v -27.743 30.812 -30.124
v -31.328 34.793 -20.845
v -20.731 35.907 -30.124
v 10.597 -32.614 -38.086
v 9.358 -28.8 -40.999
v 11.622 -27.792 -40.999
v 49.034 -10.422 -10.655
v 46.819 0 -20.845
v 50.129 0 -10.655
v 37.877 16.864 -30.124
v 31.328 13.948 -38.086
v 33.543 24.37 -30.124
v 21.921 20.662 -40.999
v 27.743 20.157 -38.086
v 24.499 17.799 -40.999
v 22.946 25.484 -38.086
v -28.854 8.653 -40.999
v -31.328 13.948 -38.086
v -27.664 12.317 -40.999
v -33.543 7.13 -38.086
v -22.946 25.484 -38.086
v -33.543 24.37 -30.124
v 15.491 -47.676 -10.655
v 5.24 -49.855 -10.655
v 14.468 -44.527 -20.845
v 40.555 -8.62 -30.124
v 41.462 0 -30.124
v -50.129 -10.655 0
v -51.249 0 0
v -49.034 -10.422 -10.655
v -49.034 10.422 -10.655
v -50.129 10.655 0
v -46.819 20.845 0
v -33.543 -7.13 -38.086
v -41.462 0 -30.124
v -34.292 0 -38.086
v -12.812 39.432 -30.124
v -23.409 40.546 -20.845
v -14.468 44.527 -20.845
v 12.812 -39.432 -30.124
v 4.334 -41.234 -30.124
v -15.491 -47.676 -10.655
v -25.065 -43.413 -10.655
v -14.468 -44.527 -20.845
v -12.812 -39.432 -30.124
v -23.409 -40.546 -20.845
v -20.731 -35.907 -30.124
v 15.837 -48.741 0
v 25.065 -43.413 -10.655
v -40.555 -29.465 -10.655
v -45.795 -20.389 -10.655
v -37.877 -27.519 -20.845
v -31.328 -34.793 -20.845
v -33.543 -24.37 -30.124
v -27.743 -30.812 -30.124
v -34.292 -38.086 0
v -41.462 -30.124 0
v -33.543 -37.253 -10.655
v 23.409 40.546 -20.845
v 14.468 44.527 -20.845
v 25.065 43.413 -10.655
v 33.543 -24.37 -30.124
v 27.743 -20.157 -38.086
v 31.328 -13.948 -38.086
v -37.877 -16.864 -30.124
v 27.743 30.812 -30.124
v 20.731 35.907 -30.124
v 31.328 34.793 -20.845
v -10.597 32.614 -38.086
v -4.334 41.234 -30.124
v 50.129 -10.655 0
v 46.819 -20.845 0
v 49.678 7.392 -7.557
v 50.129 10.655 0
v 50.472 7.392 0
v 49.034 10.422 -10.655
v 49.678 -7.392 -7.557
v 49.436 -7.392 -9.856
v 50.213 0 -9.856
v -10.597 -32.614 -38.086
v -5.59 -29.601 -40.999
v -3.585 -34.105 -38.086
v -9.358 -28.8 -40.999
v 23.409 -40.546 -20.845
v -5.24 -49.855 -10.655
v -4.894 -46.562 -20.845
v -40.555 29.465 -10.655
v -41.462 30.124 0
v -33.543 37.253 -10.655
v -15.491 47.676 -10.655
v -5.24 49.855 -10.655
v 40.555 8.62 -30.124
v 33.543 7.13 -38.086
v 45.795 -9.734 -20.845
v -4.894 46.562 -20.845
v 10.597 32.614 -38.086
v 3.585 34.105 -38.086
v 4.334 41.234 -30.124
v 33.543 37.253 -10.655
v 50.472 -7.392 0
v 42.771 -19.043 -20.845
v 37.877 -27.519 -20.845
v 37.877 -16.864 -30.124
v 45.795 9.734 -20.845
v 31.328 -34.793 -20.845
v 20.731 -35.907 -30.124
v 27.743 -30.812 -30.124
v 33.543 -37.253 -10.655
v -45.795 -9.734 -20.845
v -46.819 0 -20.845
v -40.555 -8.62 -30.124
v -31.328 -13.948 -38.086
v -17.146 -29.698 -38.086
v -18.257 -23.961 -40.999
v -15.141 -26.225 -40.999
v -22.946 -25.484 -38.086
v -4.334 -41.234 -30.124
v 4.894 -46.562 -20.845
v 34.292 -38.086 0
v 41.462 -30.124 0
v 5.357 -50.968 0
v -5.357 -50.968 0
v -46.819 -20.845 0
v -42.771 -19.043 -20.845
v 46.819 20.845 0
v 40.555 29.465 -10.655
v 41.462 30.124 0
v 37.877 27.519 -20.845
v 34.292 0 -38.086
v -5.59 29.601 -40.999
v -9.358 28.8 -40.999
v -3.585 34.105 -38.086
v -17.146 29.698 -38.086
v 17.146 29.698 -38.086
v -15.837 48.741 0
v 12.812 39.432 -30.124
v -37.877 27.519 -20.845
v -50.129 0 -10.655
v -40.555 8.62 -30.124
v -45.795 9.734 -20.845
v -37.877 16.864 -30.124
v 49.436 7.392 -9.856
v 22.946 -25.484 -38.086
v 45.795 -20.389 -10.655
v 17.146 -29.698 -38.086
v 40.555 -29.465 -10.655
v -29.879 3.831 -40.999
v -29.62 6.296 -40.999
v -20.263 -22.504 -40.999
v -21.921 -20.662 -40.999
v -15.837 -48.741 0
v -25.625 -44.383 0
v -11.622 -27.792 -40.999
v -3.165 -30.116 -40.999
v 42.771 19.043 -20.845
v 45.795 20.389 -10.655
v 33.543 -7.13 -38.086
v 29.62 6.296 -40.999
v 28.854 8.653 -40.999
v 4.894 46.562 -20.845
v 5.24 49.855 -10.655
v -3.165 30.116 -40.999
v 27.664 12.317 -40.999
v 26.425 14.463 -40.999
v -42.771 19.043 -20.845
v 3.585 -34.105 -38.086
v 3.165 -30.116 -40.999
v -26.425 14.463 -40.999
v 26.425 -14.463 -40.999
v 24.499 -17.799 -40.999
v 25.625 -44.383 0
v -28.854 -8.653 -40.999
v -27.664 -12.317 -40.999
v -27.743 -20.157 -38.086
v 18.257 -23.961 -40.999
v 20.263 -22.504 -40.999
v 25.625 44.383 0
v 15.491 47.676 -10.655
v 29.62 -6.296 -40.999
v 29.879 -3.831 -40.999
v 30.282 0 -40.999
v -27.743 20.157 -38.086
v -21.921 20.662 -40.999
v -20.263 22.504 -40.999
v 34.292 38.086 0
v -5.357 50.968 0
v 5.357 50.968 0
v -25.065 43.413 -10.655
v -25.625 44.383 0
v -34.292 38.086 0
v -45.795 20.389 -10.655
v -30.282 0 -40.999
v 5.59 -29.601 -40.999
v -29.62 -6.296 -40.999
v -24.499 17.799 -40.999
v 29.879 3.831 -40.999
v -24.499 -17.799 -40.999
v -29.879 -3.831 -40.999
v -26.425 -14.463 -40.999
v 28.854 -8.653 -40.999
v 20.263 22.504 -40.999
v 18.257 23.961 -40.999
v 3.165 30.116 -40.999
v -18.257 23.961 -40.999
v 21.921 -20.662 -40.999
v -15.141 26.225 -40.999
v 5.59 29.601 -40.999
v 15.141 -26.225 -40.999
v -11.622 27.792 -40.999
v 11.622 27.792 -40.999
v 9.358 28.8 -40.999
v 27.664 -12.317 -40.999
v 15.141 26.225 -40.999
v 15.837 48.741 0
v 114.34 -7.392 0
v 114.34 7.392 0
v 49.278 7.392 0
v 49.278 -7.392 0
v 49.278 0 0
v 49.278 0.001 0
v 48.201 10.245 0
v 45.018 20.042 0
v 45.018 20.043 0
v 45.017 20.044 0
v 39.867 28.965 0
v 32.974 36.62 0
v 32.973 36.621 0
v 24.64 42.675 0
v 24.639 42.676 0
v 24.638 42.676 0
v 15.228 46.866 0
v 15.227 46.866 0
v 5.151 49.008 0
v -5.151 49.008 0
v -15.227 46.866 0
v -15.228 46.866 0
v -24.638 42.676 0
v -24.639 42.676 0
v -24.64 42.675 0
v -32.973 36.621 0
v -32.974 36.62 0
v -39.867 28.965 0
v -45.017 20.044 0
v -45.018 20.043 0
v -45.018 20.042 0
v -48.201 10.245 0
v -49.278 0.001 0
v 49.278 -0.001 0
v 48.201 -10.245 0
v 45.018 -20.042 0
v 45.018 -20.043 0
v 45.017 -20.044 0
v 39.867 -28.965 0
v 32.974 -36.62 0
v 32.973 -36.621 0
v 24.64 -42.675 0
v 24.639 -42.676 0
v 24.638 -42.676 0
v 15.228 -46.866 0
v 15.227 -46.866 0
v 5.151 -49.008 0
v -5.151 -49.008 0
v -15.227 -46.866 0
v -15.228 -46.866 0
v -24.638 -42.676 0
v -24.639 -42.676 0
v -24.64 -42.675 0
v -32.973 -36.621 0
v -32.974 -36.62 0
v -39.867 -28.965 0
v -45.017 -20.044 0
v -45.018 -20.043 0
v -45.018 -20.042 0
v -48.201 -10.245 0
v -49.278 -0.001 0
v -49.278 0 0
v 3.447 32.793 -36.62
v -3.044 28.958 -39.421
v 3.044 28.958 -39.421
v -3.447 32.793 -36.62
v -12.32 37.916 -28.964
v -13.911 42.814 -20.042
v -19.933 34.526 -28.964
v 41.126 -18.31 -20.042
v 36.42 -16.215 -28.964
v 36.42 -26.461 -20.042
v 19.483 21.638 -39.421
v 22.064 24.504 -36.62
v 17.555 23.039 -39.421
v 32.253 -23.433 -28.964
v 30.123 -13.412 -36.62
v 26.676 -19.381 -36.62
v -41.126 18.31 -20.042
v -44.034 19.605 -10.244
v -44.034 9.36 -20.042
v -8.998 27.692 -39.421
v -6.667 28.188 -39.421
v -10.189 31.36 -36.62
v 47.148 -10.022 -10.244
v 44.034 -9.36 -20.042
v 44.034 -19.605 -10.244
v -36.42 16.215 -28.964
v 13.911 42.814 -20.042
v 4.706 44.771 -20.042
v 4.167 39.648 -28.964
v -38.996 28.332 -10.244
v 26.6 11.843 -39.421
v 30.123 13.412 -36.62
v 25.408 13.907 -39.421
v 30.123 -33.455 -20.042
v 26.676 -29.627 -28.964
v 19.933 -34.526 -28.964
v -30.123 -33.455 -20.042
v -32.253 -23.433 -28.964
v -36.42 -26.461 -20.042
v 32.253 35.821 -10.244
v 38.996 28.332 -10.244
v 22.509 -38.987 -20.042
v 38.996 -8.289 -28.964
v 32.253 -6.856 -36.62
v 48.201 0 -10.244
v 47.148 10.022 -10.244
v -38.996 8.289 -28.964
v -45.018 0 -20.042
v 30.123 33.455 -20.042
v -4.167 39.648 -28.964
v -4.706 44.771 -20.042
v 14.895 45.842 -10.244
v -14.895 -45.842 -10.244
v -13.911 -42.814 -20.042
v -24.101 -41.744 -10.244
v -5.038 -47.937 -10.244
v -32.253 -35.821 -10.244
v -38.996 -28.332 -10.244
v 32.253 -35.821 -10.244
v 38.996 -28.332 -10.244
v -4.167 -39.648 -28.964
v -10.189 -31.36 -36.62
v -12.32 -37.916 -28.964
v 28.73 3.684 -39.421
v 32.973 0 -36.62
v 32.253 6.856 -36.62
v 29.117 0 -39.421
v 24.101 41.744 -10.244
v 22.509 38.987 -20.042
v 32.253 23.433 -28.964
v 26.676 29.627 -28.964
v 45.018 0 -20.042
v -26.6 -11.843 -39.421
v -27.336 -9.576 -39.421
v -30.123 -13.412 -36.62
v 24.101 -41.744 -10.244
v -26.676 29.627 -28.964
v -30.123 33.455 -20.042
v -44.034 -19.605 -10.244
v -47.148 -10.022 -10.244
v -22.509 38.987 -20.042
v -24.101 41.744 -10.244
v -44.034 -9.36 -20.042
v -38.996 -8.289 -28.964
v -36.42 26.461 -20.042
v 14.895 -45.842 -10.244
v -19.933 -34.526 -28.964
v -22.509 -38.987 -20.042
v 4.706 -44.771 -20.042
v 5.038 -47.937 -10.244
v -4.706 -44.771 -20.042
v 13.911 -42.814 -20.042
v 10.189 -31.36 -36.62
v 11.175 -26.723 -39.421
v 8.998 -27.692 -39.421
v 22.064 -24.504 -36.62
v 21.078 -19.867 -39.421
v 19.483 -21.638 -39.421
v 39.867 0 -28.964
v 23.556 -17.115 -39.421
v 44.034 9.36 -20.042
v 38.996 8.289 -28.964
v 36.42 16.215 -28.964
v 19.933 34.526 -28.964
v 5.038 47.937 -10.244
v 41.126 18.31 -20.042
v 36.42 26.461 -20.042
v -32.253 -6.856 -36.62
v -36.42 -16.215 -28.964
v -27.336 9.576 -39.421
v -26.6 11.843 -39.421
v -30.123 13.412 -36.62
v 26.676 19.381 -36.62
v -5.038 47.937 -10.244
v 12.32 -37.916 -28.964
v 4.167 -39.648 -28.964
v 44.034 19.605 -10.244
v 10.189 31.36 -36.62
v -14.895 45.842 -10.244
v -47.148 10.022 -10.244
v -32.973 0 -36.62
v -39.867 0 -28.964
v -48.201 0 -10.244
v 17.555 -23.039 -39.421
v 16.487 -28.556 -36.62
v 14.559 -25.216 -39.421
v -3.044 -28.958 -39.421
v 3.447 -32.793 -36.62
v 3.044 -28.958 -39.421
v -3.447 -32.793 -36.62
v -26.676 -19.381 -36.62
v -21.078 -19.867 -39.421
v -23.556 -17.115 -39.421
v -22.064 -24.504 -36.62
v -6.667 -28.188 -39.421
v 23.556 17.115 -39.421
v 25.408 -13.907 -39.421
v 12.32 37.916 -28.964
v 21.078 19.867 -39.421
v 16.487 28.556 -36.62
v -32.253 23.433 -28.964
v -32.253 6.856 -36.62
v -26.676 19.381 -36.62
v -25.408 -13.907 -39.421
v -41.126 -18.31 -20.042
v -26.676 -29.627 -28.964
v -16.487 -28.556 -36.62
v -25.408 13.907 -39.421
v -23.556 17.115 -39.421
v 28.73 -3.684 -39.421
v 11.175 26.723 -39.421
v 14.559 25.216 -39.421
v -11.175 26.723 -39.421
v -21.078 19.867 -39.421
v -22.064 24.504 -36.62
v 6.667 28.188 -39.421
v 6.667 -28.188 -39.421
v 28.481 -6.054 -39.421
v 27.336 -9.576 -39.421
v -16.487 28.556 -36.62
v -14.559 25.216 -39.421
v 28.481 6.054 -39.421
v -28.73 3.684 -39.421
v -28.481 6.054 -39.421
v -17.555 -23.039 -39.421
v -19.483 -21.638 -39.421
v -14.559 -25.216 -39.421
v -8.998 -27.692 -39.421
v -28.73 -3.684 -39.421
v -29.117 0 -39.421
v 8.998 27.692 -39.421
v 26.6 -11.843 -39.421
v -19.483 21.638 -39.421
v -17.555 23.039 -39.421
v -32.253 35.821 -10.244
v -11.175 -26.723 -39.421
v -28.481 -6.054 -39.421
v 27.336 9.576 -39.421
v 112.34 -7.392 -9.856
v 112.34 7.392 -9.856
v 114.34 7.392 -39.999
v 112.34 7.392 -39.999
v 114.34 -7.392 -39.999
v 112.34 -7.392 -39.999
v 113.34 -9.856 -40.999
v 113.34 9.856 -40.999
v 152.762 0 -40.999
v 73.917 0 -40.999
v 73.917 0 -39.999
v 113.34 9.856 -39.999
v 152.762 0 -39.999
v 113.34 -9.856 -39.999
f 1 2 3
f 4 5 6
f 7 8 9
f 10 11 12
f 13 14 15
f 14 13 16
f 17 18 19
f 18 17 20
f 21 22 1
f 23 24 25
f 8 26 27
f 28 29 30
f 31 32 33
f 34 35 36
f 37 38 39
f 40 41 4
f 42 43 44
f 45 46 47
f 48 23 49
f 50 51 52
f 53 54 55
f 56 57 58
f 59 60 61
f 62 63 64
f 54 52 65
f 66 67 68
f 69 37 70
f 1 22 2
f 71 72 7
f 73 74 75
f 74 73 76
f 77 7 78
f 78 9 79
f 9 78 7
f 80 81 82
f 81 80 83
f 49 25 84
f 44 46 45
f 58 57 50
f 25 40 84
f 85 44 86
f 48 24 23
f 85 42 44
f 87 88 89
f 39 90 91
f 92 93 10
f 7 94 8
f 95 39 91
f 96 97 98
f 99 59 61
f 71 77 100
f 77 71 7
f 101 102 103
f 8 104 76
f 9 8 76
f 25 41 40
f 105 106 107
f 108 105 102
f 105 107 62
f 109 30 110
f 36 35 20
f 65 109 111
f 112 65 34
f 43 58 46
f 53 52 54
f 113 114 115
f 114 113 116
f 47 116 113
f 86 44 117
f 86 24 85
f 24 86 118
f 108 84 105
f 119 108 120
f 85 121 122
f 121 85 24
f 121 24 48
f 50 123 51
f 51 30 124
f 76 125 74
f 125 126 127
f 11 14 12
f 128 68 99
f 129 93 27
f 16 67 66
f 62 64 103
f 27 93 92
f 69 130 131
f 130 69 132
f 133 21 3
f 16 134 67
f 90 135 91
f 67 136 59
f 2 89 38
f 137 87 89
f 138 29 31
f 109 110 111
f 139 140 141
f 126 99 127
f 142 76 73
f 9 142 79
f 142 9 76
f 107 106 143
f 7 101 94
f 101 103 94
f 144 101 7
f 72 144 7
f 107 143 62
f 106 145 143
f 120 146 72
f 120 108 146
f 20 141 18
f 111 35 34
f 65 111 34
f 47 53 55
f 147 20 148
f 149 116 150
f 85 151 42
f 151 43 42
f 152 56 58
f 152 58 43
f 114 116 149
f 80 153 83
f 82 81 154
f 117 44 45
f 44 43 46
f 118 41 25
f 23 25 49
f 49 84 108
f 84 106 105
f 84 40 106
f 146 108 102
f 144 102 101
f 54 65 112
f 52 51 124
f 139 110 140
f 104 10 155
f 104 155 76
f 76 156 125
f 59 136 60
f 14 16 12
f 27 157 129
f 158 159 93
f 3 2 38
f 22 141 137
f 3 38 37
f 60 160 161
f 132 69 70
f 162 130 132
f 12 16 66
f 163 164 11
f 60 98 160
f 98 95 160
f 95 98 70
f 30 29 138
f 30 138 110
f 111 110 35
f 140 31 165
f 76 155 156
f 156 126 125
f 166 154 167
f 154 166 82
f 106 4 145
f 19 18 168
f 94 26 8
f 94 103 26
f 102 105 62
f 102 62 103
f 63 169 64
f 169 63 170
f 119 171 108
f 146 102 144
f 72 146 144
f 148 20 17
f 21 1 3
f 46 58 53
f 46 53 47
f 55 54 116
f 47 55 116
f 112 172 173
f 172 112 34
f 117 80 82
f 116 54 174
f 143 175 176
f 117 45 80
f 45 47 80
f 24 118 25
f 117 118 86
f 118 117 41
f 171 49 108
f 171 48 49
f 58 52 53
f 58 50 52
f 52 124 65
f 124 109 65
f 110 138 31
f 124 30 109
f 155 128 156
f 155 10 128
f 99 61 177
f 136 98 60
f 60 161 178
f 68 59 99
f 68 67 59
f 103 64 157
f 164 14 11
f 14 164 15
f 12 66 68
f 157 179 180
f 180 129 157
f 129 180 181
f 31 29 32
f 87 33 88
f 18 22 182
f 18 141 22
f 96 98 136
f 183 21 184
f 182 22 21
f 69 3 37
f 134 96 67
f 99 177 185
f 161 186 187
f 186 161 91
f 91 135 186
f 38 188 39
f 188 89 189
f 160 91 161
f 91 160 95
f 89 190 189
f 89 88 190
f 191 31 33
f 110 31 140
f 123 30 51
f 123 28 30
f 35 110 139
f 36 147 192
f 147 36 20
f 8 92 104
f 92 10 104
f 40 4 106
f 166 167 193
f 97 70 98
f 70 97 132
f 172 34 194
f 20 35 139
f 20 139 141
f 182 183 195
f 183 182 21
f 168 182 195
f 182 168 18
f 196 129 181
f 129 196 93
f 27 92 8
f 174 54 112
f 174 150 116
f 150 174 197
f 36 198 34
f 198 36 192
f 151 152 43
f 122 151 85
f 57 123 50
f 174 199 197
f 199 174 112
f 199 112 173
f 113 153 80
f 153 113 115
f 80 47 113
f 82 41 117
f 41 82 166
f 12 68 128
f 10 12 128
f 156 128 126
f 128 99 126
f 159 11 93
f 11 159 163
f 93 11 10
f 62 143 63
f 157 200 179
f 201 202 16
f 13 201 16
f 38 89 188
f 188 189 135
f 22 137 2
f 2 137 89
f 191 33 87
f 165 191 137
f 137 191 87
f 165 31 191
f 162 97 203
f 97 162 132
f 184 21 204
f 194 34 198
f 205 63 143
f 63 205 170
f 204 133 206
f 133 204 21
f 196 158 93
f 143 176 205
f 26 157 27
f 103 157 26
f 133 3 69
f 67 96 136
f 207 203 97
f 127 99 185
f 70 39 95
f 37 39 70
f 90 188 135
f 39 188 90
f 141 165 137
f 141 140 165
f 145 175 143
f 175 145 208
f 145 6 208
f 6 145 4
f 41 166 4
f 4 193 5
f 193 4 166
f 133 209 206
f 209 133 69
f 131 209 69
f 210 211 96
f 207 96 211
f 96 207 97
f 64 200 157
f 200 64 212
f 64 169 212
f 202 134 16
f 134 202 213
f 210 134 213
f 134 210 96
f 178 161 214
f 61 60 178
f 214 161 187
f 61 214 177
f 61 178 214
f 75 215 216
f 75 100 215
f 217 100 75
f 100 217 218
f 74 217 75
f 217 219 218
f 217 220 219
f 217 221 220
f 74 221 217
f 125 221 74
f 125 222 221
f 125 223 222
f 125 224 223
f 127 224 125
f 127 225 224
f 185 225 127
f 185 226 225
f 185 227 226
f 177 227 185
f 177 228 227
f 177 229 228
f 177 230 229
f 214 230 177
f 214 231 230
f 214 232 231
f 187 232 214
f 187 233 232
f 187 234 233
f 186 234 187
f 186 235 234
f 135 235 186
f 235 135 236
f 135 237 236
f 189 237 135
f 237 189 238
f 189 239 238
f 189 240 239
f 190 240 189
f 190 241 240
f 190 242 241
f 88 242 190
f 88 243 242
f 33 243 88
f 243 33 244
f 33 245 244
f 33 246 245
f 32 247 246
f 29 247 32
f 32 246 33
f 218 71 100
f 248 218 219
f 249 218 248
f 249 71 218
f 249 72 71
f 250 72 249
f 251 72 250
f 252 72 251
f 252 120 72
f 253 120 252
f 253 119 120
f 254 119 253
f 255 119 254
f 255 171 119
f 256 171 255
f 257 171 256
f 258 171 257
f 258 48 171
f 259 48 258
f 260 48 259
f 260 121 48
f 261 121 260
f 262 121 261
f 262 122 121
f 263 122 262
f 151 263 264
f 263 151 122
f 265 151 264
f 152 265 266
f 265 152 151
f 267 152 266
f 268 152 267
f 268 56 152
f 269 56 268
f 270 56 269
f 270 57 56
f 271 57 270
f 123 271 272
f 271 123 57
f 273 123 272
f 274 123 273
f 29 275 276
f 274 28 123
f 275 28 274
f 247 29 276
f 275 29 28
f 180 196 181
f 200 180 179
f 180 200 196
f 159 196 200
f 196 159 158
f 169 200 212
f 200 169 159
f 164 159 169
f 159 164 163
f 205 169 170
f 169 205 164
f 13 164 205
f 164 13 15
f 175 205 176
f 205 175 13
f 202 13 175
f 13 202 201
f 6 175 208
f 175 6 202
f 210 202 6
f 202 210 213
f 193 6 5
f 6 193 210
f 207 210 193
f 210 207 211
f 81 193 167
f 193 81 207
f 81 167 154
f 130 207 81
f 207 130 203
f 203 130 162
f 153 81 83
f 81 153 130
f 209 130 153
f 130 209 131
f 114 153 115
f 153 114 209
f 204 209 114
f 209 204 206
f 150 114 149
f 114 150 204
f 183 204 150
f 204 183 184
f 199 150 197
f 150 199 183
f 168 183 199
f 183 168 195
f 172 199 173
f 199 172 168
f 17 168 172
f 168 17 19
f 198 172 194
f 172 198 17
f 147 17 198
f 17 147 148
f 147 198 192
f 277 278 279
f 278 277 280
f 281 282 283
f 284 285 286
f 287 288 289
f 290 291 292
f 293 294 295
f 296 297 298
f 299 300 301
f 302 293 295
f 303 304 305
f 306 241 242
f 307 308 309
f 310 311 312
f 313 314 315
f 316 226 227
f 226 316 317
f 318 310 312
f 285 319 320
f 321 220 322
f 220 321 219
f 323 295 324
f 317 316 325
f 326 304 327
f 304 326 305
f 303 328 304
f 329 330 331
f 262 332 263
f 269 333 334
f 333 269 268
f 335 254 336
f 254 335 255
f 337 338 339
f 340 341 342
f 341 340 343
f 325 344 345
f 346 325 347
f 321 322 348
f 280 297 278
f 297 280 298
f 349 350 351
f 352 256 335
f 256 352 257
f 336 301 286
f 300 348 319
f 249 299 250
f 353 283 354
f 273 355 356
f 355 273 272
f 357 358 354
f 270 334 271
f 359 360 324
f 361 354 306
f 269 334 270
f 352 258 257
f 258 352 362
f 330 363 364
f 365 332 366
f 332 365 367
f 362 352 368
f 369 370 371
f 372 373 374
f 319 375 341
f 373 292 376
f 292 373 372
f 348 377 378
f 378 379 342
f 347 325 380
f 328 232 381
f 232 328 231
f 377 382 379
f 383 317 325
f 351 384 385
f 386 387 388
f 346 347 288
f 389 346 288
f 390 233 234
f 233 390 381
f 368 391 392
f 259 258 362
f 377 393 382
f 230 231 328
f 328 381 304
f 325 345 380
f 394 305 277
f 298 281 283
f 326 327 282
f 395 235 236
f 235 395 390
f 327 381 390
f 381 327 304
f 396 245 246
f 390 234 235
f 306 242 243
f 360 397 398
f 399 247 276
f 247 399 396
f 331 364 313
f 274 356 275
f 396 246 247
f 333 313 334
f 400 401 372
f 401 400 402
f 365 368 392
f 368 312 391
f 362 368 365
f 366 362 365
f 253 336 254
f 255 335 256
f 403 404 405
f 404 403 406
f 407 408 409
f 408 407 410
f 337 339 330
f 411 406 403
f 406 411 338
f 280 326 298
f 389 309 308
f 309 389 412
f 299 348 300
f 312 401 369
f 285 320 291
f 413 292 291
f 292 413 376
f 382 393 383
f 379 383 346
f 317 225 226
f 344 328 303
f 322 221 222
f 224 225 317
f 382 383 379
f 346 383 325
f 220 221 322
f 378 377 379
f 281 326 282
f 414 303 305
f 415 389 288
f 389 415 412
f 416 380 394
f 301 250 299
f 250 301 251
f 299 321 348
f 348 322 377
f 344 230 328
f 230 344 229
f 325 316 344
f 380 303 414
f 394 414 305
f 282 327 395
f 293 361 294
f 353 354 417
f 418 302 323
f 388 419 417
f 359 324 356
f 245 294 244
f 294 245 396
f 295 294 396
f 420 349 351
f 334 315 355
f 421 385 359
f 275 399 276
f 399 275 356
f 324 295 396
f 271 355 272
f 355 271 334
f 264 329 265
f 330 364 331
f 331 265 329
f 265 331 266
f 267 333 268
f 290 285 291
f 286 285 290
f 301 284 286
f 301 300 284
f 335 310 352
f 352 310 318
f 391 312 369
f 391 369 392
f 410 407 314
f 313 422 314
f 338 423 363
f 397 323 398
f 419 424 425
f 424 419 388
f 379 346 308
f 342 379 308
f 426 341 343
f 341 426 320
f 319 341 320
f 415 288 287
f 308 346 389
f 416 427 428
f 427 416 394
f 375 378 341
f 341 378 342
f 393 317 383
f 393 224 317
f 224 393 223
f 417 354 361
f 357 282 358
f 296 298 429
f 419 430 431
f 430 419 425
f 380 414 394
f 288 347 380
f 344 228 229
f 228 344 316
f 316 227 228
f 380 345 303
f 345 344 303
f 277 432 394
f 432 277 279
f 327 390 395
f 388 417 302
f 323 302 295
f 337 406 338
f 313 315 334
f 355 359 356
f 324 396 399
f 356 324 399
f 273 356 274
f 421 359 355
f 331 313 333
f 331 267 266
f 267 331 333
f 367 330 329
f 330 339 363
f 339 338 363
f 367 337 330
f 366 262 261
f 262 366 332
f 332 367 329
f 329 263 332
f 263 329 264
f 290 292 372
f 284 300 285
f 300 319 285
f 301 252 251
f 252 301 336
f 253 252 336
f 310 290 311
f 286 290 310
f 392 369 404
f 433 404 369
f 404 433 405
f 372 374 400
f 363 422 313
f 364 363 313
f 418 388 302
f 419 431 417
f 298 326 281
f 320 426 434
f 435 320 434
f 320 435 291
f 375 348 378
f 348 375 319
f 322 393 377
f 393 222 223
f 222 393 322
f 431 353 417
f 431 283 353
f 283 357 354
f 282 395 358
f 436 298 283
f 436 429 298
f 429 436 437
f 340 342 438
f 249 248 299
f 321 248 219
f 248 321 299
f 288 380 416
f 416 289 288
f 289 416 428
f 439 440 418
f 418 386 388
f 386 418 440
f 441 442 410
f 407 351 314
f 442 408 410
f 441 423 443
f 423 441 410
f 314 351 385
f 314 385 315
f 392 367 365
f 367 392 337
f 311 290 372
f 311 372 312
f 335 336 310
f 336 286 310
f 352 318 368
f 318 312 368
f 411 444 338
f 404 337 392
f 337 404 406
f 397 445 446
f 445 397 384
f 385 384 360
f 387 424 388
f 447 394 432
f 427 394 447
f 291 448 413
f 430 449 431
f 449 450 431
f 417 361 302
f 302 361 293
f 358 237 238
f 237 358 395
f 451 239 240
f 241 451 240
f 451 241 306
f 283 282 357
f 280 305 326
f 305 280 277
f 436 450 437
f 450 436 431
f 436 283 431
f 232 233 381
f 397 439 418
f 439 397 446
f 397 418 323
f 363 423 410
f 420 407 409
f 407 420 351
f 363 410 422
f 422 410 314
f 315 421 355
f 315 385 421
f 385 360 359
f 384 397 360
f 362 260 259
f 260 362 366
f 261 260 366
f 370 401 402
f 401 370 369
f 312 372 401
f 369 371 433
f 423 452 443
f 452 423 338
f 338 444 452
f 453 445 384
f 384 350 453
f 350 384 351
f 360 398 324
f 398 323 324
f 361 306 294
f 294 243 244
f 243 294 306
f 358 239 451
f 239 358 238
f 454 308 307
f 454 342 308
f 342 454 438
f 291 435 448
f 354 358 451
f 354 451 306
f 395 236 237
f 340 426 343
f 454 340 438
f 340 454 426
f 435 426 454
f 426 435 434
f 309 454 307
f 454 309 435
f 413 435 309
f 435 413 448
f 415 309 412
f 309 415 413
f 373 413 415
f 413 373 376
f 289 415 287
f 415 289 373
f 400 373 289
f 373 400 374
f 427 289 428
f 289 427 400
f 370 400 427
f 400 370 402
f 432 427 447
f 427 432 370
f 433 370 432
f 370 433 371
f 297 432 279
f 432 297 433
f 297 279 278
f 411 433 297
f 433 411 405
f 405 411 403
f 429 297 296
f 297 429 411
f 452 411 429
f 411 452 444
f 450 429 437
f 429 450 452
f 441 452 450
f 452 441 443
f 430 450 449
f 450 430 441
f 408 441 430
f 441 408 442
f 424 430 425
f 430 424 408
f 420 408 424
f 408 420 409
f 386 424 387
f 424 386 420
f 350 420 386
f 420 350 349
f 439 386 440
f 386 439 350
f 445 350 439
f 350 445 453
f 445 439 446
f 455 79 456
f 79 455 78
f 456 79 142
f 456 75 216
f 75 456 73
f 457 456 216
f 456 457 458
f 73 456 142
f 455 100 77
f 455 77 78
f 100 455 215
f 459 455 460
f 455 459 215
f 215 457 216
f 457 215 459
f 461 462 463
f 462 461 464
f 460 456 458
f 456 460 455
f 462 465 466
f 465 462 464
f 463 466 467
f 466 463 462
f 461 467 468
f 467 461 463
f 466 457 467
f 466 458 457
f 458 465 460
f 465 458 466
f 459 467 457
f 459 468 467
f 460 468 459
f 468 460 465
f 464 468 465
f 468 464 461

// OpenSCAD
//Volume in mL or CC.
volume=236.588;

wallThick=1.04; // [1.04:1.20]

//Who says it has to stay the same...
pi=3.1415926536;
radius=10*pow((volume*375)/(236*pi),1/3);

handlX=1.3*radius;
handlY=0.3*radius;
handlZ=0.2*radius;

//Resolution
res=30;

echo("volume: " );echo(volume);
echo("height: " );echo(4*radius/5);
echo("radius: ");echo(radius);
echo("thickness: ");echo(radius*(wallThick-1));

module cup(r)
{

	difference()
	{
	sphere(r,$fn=res);
	translate([0,0,(r+1)])cube(2*(r+1),true);

	translate([0,0,-(r+1)-4*r/5])cube(2*(r+1),true);
	}
}

difference()
{
cup(radius*wallThick);
translate([0,0,0.001])cup(radius);	
}

translate([(handlX/2)+radius,0,-handlZ/2])cube([handlX,handlY,handlZ],true);
translate([(handlX/2)+radius+handlX/2,0,-(4*radius*wallThick/5)/2])cube([2,handlY,(4*radius*wallThick/5)],true);
translate([(handlX/2)+radius+handlX/2,0,-(4*radius*wallThick/5)])scale([4,1,1])cylinder(r=2*handlY/3,h=1,$fn=4);
